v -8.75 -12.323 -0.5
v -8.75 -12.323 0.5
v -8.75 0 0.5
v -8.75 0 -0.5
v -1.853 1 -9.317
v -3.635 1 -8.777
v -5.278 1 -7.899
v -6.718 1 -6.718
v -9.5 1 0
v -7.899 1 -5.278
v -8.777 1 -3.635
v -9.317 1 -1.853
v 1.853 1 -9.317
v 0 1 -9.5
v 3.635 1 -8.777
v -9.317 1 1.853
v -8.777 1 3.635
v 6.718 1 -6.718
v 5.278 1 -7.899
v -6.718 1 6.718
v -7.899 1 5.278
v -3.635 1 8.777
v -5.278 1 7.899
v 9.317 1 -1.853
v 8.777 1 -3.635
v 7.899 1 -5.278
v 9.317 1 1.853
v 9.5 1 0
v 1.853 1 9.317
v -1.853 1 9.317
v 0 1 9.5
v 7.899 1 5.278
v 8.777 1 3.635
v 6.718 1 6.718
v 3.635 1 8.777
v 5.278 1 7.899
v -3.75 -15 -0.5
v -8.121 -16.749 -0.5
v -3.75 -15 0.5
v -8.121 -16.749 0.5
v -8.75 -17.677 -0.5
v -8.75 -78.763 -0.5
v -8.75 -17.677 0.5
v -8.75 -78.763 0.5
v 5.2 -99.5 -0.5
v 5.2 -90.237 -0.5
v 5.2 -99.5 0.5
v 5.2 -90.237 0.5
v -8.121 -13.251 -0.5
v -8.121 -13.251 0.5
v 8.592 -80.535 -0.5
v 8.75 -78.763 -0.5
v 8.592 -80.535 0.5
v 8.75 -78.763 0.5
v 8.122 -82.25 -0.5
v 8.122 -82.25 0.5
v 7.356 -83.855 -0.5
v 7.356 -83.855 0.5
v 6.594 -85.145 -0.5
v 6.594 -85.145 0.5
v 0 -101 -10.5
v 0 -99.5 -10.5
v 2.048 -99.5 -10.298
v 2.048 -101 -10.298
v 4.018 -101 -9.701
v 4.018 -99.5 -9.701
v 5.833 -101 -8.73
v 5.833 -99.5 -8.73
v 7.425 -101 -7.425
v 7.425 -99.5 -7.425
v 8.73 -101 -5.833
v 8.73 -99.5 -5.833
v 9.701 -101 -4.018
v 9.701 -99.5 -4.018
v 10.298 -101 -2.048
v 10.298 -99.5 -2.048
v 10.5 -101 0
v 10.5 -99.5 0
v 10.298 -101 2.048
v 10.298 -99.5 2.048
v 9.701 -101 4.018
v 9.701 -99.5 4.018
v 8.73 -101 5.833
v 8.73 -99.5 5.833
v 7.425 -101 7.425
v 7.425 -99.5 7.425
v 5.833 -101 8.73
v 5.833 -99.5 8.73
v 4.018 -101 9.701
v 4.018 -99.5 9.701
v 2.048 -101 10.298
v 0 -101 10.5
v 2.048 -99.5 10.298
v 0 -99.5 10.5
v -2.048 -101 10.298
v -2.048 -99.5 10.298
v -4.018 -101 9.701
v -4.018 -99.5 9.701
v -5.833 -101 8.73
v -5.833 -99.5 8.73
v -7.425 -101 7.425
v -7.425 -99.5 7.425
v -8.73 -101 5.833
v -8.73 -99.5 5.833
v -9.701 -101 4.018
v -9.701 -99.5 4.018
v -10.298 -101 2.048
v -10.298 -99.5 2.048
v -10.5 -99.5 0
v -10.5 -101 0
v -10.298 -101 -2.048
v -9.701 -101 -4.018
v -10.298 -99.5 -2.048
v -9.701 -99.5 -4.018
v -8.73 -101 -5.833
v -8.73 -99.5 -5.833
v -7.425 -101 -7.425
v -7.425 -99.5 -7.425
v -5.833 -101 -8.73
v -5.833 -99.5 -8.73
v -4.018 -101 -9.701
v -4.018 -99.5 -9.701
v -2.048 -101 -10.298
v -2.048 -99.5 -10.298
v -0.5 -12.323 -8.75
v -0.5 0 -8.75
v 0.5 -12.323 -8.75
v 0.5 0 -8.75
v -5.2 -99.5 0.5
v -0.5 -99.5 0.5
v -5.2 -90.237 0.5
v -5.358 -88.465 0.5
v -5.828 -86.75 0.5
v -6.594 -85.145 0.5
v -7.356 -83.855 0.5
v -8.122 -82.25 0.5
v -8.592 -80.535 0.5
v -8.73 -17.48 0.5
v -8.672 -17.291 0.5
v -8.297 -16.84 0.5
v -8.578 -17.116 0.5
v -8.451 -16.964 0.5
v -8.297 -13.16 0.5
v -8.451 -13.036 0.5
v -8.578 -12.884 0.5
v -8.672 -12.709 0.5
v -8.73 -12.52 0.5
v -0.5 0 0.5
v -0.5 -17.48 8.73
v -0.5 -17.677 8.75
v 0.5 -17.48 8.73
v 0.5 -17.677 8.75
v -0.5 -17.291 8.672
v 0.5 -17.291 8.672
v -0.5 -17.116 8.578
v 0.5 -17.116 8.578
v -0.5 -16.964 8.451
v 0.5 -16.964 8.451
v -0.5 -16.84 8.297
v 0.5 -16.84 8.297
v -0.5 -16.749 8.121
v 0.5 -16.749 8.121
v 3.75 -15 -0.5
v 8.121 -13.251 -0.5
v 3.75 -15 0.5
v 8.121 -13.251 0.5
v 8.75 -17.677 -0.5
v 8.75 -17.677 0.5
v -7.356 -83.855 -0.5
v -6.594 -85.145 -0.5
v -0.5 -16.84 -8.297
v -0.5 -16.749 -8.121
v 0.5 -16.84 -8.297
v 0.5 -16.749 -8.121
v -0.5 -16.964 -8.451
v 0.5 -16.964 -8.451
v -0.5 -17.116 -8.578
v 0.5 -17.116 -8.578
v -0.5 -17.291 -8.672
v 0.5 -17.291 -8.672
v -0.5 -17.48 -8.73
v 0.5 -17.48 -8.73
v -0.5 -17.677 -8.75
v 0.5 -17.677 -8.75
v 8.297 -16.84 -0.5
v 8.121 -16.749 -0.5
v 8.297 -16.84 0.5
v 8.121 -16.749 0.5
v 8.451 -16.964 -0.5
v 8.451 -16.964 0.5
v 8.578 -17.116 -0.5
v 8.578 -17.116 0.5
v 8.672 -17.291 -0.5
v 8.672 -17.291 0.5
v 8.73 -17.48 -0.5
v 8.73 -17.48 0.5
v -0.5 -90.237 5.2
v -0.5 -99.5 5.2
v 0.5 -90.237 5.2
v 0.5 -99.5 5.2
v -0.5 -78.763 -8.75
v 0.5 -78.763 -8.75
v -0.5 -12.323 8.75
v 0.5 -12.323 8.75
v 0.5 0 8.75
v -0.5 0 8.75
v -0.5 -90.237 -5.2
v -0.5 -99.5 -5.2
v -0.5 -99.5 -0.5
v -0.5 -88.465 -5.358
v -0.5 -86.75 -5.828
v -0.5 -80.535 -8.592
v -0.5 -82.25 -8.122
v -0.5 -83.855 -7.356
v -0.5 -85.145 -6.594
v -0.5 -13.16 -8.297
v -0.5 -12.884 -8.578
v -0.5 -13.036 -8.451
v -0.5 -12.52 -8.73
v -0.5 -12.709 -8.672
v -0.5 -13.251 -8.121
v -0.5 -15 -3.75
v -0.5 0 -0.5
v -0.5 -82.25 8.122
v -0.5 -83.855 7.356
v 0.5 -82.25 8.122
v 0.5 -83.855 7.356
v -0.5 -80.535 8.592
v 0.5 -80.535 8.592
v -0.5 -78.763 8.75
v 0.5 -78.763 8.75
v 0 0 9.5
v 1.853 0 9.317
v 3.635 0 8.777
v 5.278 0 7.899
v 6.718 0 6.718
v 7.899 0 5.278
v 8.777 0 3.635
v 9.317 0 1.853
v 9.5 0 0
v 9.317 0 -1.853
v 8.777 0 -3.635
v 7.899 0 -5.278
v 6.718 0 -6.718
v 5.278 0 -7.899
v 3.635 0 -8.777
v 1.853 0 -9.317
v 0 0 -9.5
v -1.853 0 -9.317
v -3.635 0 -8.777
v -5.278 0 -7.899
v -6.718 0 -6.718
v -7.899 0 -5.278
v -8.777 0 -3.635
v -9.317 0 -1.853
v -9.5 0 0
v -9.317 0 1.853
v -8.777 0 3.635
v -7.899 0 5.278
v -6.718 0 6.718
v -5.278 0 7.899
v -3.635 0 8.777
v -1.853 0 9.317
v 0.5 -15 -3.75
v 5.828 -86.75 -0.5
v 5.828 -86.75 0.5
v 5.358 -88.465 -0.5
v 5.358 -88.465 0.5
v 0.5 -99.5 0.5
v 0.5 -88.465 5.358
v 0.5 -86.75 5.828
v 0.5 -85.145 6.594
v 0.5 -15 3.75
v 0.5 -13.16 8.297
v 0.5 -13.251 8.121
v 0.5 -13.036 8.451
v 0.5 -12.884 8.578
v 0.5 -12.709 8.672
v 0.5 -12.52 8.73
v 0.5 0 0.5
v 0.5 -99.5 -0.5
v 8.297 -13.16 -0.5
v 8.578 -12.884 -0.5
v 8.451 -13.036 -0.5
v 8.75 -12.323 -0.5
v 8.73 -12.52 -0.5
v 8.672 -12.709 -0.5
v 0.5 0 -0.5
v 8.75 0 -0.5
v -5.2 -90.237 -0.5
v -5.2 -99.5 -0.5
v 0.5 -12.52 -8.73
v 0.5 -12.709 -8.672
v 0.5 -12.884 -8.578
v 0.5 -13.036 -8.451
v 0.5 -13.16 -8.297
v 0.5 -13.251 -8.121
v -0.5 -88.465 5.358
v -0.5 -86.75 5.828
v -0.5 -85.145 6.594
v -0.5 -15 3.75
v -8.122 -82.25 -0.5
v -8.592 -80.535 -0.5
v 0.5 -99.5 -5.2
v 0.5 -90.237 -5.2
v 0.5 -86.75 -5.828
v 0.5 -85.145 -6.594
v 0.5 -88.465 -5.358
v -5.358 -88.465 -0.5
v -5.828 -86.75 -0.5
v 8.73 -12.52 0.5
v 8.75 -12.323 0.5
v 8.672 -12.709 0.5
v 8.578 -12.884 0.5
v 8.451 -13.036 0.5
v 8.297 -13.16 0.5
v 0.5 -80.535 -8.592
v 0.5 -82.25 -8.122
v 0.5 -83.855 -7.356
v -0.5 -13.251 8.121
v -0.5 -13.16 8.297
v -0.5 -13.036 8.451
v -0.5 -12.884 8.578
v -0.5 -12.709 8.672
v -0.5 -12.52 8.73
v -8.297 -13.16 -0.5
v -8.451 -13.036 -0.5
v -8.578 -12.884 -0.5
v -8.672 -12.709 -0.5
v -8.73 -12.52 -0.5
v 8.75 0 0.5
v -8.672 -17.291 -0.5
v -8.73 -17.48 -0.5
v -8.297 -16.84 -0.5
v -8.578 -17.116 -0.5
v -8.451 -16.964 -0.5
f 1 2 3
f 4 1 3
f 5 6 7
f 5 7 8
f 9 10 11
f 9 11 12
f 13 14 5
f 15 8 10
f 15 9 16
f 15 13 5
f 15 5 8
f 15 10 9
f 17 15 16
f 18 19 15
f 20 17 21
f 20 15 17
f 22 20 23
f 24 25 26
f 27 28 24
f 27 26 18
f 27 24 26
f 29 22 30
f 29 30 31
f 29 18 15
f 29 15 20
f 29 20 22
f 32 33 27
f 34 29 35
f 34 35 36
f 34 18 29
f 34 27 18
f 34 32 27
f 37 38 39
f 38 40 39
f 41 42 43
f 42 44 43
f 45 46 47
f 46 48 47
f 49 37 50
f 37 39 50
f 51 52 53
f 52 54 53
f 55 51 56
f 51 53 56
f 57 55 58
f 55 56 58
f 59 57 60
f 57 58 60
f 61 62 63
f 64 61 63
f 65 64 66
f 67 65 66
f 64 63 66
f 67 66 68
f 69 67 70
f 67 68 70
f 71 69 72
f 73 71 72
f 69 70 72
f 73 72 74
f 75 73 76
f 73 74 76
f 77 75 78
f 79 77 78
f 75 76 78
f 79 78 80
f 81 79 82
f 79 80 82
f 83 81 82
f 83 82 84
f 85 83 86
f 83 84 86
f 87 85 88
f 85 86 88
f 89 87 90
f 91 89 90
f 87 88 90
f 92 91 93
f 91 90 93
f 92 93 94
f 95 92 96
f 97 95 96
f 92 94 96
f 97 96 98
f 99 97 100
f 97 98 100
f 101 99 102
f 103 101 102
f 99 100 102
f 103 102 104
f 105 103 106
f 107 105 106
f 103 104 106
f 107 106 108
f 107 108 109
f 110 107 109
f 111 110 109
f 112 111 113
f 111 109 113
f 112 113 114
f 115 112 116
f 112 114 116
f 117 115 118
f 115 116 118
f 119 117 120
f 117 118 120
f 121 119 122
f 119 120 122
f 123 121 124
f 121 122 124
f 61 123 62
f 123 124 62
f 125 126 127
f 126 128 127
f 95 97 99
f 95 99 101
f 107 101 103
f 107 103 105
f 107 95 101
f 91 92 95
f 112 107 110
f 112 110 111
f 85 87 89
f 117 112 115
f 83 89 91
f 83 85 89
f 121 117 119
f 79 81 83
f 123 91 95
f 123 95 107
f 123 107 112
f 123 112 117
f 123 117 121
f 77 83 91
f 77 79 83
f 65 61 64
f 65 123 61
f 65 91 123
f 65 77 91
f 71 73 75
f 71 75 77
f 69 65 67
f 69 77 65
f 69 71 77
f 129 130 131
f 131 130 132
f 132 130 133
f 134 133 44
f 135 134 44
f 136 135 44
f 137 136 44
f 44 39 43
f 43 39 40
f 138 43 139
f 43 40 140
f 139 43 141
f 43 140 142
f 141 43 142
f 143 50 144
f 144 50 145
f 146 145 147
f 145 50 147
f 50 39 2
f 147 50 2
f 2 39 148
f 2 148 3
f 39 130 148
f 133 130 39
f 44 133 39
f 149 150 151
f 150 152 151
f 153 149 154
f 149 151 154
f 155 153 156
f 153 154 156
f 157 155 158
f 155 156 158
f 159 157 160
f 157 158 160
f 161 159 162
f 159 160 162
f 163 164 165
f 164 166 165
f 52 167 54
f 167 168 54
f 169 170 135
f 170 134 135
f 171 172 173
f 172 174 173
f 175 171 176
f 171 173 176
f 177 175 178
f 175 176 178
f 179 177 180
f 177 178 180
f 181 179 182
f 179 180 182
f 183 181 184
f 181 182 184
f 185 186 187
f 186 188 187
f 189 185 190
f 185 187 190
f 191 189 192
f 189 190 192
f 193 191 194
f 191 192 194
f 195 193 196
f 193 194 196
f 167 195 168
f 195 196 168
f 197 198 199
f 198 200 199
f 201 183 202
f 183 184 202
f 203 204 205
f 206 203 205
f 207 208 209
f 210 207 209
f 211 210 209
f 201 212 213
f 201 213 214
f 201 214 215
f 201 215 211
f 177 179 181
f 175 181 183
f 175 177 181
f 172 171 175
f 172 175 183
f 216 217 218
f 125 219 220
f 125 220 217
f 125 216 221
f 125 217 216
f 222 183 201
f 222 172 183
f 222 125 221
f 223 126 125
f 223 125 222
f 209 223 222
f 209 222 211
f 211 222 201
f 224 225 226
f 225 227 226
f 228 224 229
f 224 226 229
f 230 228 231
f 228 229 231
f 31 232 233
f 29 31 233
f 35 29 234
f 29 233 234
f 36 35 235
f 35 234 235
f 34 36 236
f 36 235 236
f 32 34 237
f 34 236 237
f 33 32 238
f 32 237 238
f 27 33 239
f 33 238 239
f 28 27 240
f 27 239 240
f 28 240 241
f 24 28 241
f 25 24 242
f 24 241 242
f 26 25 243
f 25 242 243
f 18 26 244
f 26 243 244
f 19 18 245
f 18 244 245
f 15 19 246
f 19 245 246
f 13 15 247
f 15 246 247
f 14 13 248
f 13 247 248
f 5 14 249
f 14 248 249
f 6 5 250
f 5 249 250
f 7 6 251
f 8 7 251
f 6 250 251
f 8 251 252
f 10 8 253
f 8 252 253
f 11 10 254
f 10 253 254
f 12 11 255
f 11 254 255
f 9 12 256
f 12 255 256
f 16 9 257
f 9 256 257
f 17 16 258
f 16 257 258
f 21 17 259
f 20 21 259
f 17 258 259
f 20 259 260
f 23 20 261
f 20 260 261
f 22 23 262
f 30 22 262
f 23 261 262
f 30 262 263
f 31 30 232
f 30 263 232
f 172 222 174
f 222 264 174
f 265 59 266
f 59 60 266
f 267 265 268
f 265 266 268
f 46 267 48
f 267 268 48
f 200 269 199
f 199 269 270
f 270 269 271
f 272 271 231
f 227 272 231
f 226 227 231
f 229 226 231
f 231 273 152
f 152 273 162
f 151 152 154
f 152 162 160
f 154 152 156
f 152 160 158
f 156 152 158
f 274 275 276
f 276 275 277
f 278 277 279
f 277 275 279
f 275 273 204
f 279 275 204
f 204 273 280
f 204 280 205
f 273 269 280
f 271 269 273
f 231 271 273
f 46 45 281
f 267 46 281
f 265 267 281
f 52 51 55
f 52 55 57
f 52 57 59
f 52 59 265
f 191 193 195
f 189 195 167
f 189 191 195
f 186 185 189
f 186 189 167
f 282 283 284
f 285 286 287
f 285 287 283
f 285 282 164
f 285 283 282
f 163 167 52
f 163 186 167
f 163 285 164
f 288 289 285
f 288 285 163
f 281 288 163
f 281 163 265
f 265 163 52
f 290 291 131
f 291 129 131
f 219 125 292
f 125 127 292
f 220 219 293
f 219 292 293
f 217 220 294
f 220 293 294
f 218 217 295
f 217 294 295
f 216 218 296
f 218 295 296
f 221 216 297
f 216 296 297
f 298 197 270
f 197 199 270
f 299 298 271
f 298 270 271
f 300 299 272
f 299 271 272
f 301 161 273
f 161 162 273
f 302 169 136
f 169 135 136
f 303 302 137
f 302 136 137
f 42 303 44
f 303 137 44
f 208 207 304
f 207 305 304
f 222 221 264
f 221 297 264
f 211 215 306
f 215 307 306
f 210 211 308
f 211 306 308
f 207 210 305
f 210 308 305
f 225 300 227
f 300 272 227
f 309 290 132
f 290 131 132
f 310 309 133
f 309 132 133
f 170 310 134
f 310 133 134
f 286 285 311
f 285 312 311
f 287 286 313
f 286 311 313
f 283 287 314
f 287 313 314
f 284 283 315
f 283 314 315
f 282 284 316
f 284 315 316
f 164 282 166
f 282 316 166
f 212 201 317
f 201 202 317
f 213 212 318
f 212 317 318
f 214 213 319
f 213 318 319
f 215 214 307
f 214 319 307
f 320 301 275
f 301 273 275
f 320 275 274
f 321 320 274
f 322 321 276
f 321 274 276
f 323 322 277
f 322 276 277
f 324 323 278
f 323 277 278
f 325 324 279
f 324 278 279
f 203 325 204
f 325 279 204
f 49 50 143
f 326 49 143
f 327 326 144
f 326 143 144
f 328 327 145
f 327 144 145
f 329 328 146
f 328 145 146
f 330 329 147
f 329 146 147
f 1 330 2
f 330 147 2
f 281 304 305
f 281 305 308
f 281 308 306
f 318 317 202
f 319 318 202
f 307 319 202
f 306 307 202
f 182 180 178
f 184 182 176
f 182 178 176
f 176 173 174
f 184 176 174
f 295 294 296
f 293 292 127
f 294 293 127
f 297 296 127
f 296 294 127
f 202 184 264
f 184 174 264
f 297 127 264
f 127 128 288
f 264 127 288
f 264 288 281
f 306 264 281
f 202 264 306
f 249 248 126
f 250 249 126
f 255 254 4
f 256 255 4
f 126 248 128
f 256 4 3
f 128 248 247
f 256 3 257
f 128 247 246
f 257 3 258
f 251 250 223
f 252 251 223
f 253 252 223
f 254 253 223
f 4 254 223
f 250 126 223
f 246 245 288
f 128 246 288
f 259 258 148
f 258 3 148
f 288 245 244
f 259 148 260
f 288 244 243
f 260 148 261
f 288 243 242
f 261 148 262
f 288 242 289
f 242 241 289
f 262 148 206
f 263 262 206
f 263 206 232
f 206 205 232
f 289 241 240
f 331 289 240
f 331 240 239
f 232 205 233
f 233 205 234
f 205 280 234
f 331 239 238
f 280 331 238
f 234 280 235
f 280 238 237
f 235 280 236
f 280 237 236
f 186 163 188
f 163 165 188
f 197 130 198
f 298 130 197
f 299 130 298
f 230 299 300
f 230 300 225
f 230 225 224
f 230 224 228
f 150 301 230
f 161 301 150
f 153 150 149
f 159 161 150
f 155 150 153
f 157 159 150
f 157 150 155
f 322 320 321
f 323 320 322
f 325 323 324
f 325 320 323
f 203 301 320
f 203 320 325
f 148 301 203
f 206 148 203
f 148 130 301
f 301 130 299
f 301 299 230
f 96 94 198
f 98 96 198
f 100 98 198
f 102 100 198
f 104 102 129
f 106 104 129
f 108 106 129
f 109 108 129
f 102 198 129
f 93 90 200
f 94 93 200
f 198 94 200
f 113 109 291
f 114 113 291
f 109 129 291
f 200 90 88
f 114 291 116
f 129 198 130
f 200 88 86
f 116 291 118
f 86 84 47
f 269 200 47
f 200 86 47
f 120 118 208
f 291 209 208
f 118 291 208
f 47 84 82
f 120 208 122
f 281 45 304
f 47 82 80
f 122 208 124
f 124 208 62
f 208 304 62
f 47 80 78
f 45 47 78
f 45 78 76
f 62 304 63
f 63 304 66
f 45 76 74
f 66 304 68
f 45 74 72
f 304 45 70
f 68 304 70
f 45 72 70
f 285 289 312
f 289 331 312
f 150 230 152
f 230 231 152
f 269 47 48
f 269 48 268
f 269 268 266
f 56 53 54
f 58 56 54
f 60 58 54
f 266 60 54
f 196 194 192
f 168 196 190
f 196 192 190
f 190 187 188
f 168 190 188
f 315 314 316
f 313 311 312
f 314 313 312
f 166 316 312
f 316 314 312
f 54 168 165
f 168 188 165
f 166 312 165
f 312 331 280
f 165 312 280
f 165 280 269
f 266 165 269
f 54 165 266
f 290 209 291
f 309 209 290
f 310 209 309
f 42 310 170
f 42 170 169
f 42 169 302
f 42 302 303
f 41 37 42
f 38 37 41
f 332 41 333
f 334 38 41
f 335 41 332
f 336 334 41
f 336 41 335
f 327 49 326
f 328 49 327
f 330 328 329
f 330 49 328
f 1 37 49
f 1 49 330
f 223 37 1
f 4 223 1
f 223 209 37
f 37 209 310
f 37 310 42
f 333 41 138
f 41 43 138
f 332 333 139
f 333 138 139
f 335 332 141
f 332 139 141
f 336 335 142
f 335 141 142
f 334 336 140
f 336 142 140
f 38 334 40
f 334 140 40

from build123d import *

# Parameters (mm, degrees)
EXTRUDE_1_DEPTH          = 0.5
PATTERN_CIRCULAR_1_COUNT = 2
PATTERN_CIRCULAR_1_ANGLE = 90
SKETCH_3_R               = 9.5
EXTRUDE_2_DEPTH          = 1
SKETCH_4_R               = 10.5
EXTRUDE_3_DEPTH          = 1.5


with BuildPart() as part:
    # Эскиз1 → Бобышка-Вытянуть1 (new, symmetric)
    with BuildSketch(Plane.XY):
        with BuildLine():
            Line((-8.75, 0), (8.75, 0))
            Line((8.75, 0), (8.75, -12.322967039))
            ThreePointArc((8.75, -12.322967039), (8.57806723, -12.883595848), (8.121390676, -13.251443729))
            Line((8.121390676, -13.251443729), (3.75, -15))
            Line((3.75, -15), (8.121390676, -16.748556271))
            ThreePointArc((8.121390676, -16.748556271), (8.57806723, -17.116404152), (8.75, -17.677032961))
            Line((8.75, -17.677032961), (8.75, -78.763241336))
            ThreePointArc((8.75, -78.763241336), (8.395311893, -81.402930425), (7.356408303, -83.855366249))
            Line((7.356408303, -83.855366249), (6.593591697, -85.144633751))
            ThreePointArc((6.593591697, -85.144633751), (5.554688107, -87.597069575), (5.2, -90.236758664))
            Line((5.2, -90.236758664), (5.2, -99.5))
            Line((5.2, -99.5), (-5.2, -99.5))
            Line((-5.2, -99.5), (-5.2, -90.236758664))
            ThreePointArc((-5.2, -90.236758664), (-5.554688107, -87.597069575), (-6.593591697, -85.144633751))
            Line((-6.593591697, -85.144633751), (-7.356408303, -83.855366249))
            ThreePointArc((-7.356408303, -83.855366249), (-8.395311893, -81.402930425), (-8.75, -78.763241336))
            Line((-8.75, -78.763241336), (-8.75, -17.677032961))
            ThreePointArc((-8.75, -17.677032961), (-8.57806723, -17.116404152), (-8.121390676, -16.748556271))
            Line((-8.121390676, -16.748556271), (-3.75, -15))
            Line((-3.75, -15), (-8.121390676, -13.251443729))
            ThreePointArc((-8.121390676, -13.251443729), (-8.57806723, -12.883595848), (-8.75, -12.322967039))
            Line((-8.75, -12.322967039), (-8.75, 0))
        make_face()
    extrude_1 = extrude(amount=EXTRUDE_1_DEPTH, both=True)

    # Круговой массив1: Бобышка-Вытянуть1 ×2 about axis
    pattern_circular_1_axis = Axis((0, 0, 0), (0, 1, 0))
    for i in range(1, PATTERN_CIRCULAR_1_COUNT):
        add(extrude_1.rotate(pattern_circular_1_axis, i * PATTERN_CIRCULAR_1_ANGLE / (PATTERN_CIRCULAR_1_COUNT - 1)))

    # Эскиз3 → Бобышка-Вытянуть2 (add)
    with BuildSketch(Plane(origin=(0, 0, 0), x_dir=(1, 0, 0), z_dir=(0, 1, 0))):
        with Locations(Location((0, 0, 0), (0, 0, 270))):
            Circle(SKETCH_3_R)
    extrude(amount=EXTRUDE_2_DEPTH)

    # Эскиз4 → Бобышка-Вытянуть3 (add)
    with BuildSketch(Plane.XZ.offset(99.5)):
        with Locations(Location((0, 0, 0), (0, 0, 270))):
            Circle(SKETCH_4_R)
    extrude(amount=EXTRUDE_3_DEPTH)


solid = part.part
